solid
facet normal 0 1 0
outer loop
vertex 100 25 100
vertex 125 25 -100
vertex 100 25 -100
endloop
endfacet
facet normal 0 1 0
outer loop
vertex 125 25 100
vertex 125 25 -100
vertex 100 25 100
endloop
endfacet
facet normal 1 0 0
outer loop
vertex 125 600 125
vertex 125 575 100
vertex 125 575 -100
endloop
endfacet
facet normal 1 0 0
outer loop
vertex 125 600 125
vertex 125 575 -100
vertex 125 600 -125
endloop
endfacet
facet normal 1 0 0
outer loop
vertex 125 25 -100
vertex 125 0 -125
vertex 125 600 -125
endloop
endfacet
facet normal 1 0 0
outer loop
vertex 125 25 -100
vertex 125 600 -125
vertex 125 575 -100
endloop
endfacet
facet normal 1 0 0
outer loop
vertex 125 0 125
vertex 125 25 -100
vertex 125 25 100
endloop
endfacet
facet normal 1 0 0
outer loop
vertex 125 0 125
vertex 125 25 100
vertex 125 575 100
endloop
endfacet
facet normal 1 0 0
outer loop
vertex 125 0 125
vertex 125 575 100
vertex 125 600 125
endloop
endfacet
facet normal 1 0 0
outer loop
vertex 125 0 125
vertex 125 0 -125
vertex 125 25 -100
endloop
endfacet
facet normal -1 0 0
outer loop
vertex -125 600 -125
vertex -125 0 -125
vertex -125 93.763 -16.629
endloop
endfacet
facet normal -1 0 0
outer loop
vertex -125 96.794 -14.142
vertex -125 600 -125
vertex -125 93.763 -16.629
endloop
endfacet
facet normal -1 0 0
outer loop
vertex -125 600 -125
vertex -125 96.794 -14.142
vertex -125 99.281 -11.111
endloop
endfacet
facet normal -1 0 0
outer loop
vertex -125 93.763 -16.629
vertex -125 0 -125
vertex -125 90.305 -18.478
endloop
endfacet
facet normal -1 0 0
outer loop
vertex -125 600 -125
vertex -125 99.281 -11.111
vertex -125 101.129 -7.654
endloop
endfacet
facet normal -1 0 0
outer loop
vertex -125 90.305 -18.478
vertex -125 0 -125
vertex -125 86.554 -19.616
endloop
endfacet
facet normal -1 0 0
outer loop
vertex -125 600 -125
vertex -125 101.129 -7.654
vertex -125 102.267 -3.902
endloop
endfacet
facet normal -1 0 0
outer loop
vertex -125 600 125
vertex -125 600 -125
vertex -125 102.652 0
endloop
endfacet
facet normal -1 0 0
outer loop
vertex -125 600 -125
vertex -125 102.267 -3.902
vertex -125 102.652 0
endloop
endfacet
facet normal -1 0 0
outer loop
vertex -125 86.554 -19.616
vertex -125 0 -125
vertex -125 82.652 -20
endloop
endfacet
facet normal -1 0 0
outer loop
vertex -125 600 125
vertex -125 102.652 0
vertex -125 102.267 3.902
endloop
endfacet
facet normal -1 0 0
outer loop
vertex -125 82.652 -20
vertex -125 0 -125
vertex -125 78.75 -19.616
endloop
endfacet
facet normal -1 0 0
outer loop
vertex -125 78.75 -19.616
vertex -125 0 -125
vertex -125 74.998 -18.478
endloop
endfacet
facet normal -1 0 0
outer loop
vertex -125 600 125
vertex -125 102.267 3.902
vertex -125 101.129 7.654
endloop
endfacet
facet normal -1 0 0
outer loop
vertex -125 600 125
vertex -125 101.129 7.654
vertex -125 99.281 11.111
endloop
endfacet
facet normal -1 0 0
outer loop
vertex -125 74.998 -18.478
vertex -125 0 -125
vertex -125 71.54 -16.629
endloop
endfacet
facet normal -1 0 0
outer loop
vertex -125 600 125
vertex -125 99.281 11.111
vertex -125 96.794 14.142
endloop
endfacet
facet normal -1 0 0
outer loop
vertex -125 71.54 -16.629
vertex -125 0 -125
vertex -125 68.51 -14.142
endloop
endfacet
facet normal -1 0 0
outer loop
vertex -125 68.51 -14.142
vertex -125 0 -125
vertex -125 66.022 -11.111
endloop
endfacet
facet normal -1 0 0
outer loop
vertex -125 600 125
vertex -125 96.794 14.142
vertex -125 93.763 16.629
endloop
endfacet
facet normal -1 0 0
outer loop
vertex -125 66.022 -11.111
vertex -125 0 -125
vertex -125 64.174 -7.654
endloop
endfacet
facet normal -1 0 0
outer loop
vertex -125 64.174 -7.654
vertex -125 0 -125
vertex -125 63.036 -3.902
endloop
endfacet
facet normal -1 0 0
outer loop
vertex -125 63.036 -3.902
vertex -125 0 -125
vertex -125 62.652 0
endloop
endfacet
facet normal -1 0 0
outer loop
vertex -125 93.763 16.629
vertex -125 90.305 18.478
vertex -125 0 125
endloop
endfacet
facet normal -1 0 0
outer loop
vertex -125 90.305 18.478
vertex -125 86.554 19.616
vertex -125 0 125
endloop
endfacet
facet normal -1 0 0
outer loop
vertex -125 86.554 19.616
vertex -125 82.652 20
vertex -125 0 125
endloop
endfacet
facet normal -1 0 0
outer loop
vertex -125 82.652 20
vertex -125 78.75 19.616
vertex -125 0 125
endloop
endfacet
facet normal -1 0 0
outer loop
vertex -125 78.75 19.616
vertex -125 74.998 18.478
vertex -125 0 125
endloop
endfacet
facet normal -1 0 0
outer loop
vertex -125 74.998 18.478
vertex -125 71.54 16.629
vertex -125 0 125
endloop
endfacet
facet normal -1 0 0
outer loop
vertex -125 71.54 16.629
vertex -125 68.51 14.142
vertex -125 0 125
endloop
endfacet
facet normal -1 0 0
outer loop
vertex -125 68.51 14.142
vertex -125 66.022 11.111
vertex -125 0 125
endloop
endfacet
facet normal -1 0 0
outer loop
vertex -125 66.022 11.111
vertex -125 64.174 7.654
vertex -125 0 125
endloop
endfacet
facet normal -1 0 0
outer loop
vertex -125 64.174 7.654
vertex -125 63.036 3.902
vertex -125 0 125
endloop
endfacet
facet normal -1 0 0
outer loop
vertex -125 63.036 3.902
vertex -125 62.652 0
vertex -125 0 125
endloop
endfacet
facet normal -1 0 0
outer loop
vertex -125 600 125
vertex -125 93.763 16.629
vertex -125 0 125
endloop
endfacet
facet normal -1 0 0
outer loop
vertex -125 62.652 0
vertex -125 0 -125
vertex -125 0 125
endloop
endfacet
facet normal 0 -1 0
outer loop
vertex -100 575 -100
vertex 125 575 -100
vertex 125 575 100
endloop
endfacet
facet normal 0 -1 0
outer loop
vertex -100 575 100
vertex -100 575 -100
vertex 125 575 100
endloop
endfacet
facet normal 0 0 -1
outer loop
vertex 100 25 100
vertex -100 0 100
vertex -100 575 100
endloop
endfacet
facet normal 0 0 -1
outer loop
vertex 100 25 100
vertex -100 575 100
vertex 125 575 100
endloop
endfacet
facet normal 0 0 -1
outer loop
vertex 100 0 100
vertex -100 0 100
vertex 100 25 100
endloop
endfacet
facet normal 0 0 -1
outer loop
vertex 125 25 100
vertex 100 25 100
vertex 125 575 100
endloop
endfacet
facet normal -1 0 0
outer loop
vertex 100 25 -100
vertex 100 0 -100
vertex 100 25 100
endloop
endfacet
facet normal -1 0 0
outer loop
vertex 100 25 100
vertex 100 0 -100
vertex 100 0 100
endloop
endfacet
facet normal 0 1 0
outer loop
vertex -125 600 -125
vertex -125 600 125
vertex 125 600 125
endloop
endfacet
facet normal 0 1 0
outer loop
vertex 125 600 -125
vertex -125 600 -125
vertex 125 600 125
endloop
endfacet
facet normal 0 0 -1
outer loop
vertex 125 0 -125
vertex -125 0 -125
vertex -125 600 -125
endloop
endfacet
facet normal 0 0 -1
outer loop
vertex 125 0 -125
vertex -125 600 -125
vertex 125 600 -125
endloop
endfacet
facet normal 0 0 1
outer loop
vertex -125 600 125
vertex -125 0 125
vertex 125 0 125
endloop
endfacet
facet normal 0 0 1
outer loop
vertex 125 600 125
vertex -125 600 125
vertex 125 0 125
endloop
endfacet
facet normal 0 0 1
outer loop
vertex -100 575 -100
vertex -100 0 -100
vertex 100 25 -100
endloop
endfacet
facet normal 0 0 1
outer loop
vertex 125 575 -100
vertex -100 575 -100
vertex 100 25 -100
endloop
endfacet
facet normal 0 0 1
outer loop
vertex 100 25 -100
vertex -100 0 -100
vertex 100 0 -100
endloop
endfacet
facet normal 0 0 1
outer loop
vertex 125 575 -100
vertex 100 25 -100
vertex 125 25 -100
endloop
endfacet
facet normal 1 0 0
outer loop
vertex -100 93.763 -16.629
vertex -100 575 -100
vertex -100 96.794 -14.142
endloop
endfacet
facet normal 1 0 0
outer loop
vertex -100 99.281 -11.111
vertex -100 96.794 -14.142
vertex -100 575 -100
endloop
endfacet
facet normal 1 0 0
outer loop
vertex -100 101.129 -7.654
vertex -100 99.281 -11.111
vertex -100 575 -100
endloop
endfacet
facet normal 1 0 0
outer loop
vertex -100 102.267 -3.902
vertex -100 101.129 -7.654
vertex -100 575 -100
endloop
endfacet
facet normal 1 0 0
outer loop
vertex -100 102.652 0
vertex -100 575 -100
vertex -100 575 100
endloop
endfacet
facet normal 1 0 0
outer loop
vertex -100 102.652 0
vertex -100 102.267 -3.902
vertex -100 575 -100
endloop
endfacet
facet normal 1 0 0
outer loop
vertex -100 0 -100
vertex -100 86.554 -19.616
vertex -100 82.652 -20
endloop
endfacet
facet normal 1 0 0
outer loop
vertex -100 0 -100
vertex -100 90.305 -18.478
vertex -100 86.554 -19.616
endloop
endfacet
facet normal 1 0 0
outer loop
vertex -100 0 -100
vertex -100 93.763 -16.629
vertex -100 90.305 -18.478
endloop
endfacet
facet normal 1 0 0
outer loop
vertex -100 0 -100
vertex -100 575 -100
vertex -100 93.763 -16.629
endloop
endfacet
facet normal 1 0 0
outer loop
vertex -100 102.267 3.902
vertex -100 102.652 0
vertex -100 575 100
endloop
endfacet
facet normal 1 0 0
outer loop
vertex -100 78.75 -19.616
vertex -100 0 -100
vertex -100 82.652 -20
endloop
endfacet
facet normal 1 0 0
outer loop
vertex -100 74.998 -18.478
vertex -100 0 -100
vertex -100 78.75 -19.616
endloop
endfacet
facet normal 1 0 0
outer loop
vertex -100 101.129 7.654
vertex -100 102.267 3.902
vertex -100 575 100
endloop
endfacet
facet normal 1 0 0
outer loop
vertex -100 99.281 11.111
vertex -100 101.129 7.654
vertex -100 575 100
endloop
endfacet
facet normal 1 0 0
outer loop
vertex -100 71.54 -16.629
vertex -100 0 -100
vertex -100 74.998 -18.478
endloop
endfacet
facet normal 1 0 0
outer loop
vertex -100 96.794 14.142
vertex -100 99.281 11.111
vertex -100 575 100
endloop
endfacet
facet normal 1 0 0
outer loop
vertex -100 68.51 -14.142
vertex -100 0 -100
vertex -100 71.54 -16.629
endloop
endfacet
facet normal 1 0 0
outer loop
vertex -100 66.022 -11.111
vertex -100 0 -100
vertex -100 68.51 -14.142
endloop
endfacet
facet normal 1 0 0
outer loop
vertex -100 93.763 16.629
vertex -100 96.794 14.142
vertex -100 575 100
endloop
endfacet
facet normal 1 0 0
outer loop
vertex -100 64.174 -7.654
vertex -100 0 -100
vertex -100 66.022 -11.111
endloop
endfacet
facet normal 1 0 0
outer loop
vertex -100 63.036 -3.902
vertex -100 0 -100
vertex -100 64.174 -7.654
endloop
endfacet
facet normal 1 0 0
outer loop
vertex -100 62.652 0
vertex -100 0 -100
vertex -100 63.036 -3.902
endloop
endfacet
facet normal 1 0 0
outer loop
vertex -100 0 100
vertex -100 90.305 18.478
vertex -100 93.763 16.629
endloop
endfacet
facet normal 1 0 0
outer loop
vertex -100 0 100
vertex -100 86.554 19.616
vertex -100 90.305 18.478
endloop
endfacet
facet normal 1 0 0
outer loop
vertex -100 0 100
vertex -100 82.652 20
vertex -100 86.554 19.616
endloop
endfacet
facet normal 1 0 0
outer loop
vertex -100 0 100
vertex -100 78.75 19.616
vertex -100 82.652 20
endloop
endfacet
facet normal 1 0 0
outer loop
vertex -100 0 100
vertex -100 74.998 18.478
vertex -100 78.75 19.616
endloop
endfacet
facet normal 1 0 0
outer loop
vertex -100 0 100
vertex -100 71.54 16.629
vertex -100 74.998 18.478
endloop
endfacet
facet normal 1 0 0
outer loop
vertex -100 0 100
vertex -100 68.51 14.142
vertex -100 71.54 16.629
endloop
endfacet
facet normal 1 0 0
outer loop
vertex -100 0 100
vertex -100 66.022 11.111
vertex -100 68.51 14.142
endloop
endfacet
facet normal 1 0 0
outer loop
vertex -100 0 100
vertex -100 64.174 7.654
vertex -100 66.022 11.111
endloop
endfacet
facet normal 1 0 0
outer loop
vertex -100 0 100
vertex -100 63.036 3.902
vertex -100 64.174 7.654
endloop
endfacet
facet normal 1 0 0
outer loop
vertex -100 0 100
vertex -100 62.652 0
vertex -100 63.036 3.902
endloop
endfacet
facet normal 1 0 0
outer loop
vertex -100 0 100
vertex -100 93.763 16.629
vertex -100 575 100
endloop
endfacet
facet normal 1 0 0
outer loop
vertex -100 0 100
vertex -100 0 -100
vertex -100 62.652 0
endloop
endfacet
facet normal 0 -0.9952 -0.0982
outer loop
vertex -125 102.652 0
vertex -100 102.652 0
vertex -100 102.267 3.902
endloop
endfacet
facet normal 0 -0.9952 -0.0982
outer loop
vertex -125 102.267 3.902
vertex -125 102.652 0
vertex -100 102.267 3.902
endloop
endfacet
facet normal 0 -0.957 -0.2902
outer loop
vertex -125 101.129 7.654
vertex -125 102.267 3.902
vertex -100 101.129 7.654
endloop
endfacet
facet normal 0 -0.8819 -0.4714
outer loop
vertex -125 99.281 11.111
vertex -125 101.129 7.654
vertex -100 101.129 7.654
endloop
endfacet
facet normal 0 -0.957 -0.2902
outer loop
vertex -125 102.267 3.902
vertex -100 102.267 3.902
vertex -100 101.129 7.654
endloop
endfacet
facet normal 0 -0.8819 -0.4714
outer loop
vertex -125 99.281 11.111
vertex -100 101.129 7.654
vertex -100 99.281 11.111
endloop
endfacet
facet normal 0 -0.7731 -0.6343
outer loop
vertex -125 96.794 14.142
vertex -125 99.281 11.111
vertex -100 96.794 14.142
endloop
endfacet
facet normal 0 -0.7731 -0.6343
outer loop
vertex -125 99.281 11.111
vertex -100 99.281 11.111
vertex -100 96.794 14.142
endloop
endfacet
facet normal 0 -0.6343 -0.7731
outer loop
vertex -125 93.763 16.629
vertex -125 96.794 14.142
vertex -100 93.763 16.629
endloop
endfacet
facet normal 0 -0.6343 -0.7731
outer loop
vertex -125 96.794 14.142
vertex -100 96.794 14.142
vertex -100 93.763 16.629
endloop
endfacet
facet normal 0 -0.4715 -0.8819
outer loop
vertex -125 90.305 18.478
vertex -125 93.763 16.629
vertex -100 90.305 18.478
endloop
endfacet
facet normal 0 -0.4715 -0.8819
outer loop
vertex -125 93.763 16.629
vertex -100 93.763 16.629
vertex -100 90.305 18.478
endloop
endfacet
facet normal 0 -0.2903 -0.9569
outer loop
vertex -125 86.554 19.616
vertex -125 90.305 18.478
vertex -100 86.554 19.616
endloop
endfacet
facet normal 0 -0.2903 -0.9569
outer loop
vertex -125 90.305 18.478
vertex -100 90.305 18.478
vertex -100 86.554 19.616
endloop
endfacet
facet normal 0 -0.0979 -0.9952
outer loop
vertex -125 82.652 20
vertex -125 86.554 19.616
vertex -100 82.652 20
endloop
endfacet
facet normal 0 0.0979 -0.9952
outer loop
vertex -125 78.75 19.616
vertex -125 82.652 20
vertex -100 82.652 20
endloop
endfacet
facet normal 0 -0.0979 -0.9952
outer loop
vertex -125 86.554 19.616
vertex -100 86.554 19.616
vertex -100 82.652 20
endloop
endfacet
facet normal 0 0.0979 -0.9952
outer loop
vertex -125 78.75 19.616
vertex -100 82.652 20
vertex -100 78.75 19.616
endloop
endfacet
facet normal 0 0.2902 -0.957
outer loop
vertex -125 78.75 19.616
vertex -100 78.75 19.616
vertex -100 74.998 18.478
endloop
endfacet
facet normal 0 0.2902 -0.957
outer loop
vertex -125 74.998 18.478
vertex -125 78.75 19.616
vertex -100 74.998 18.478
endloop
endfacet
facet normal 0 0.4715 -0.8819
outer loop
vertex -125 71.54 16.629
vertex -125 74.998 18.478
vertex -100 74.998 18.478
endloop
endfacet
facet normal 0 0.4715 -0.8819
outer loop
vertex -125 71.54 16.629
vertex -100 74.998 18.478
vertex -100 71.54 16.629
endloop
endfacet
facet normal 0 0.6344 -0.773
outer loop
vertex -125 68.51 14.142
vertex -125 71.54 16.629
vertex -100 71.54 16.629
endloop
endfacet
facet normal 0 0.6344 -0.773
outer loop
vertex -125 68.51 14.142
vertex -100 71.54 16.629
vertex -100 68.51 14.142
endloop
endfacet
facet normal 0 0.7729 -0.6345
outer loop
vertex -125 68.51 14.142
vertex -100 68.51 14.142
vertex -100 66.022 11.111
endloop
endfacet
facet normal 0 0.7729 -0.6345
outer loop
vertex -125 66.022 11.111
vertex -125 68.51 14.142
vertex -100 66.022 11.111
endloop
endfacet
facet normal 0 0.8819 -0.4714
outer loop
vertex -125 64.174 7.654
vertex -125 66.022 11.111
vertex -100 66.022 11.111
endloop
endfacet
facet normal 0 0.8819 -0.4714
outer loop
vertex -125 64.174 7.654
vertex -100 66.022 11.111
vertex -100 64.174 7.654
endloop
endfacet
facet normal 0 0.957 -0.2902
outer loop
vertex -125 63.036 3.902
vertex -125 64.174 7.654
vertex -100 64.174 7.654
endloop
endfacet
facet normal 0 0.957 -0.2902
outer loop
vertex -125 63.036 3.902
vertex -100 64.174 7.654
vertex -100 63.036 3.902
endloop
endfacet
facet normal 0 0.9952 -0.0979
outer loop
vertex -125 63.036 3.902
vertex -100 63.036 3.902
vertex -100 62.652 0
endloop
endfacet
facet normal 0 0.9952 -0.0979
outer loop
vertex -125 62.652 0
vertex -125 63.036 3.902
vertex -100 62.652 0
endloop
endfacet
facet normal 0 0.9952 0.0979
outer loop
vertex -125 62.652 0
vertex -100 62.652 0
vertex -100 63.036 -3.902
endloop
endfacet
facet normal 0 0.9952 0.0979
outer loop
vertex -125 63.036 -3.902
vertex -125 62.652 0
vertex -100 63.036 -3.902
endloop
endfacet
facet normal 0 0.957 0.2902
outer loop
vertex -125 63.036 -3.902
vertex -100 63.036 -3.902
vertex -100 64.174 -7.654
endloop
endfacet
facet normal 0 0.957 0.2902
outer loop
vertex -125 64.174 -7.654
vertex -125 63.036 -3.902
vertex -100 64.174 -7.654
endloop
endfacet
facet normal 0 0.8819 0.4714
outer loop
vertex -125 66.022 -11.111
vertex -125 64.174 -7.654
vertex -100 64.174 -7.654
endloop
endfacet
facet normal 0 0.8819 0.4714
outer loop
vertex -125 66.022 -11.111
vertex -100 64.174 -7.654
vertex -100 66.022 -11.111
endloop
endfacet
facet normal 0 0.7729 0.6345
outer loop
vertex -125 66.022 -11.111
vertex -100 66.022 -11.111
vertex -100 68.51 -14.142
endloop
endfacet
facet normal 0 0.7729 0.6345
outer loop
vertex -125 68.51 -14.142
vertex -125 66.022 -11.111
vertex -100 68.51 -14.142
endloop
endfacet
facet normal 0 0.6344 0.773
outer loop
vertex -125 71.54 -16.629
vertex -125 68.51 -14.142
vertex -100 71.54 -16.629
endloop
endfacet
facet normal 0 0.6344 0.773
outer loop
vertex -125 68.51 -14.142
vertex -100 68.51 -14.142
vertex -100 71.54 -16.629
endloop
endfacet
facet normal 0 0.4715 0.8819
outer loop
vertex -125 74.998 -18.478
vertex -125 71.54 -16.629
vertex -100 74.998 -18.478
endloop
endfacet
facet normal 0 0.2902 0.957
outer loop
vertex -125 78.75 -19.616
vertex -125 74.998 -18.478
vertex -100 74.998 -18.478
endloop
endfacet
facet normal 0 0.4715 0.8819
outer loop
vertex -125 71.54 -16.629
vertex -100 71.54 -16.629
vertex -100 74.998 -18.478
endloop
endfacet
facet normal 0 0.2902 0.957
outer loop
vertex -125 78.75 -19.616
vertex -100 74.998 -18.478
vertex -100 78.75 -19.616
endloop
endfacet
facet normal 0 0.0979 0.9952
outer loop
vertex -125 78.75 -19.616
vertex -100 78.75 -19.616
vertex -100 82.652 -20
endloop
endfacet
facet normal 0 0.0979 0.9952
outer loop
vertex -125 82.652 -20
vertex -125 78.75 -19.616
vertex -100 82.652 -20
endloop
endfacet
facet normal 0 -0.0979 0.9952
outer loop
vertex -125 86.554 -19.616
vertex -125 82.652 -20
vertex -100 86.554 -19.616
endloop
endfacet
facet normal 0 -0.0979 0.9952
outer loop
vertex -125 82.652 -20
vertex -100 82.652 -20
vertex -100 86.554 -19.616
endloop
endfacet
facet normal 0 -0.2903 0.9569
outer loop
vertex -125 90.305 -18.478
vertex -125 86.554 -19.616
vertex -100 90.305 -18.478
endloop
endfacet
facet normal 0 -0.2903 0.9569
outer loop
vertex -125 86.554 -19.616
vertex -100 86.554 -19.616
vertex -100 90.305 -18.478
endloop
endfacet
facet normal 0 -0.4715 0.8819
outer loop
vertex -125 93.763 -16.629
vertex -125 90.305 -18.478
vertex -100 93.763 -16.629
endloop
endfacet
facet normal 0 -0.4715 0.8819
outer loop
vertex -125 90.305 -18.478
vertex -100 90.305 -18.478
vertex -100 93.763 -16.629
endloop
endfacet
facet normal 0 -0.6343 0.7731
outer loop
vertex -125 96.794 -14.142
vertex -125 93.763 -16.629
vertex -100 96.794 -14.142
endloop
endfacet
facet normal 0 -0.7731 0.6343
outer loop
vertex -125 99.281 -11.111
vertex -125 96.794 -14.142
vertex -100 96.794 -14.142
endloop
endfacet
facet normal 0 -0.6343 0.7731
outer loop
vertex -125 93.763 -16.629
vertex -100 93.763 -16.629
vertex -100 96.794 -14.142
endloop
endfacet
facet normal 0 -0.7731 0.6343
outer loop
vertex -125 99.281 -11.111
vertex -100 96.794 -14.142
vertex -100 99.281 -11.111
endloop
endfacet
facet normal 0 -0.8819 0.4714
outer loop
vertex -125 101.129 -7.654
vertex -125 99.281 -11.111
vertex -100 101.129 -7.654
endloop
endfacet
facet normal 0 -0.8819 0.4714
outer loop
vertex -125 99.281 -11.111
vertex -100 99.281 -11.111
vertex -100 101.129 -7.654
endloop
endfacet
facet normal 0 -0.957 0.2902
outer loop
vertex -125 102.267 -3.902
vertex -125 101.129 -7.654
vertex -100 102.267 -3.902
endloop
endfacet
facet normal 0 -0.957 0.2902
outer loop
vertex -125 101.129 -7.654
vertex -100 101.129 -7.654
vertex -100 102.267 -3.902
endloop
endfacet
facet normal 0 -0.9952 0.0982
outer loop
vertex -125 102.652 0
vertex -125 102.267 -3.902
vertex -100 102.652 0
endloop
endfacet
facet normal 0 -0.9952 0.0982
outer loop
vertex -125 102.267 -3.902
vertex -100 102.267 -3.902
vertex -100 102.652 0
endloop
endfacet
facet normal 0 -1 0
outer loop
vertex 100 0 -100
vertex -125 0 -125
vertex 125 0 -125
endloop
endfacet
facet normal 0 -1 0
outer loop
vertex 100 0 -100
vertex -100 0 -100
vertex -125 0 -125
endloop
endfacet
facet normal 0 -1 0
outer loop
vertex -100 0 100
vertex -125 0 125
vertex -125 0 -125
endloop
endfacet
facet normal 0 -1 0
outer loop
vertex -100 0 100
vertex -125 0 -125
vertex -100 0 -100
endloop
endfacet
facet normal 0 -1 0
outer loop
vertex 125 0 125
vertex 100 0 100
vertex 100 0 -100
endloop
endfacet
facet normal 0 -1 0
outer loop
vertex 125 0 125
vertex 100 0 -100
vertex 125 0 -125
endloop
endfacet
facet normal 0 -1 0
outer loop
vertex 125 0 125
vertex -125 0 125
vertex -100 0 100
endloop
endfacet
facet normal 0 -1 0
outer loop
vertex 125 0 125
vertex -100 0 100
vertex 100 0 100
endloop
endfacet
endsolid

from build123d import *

# Parameters (mm, degrees)
F0_W     = 250
F0_H     = 250
F1_DEPTH = 600
F2_W     = 200
F2_H     = 200
F3_DEPTH = 575
F4_W     = 550
F4_H     = 200
F5_DEPTH = 48
F7_D     = 40
F7_DEPTH = 25


with BuildPart() as f1:
    # F0 (on Front) → F1 (new body)
    with BuildSketch(Plane.XZ):
        Rectangle(F0_W, F0_H)
    extrude(amount=-F1_DEPTH)

    # F2 (on face) → F3 (cut)
    with BuildSketch(Plane.XZ):
        Rectangle(F2_W, F2_H)
    extrude(amount=-F3_DEPTH, mode=Mode.SUBTRACT)

    # F4 (on face) → F5 (cut)
    with BuildSketch(Plane.YZ.offset(125)):
        with Locations((300, 0)):
            Rectangle(F4_W, F4_H)
    extrude(amount=-F5_DEPTH, mode=Mode.SUBTRACT)

    # F7
    with Locations(Plane(origin=(-125, 0, 0), x_dir=(0, -1, 0), z_dir=(-1, 0, 0))):
        with Locations((-82.651734, 0)):
            Hole(F7_D / 2, depth=F7_DEPTH)


solid = f1.part
